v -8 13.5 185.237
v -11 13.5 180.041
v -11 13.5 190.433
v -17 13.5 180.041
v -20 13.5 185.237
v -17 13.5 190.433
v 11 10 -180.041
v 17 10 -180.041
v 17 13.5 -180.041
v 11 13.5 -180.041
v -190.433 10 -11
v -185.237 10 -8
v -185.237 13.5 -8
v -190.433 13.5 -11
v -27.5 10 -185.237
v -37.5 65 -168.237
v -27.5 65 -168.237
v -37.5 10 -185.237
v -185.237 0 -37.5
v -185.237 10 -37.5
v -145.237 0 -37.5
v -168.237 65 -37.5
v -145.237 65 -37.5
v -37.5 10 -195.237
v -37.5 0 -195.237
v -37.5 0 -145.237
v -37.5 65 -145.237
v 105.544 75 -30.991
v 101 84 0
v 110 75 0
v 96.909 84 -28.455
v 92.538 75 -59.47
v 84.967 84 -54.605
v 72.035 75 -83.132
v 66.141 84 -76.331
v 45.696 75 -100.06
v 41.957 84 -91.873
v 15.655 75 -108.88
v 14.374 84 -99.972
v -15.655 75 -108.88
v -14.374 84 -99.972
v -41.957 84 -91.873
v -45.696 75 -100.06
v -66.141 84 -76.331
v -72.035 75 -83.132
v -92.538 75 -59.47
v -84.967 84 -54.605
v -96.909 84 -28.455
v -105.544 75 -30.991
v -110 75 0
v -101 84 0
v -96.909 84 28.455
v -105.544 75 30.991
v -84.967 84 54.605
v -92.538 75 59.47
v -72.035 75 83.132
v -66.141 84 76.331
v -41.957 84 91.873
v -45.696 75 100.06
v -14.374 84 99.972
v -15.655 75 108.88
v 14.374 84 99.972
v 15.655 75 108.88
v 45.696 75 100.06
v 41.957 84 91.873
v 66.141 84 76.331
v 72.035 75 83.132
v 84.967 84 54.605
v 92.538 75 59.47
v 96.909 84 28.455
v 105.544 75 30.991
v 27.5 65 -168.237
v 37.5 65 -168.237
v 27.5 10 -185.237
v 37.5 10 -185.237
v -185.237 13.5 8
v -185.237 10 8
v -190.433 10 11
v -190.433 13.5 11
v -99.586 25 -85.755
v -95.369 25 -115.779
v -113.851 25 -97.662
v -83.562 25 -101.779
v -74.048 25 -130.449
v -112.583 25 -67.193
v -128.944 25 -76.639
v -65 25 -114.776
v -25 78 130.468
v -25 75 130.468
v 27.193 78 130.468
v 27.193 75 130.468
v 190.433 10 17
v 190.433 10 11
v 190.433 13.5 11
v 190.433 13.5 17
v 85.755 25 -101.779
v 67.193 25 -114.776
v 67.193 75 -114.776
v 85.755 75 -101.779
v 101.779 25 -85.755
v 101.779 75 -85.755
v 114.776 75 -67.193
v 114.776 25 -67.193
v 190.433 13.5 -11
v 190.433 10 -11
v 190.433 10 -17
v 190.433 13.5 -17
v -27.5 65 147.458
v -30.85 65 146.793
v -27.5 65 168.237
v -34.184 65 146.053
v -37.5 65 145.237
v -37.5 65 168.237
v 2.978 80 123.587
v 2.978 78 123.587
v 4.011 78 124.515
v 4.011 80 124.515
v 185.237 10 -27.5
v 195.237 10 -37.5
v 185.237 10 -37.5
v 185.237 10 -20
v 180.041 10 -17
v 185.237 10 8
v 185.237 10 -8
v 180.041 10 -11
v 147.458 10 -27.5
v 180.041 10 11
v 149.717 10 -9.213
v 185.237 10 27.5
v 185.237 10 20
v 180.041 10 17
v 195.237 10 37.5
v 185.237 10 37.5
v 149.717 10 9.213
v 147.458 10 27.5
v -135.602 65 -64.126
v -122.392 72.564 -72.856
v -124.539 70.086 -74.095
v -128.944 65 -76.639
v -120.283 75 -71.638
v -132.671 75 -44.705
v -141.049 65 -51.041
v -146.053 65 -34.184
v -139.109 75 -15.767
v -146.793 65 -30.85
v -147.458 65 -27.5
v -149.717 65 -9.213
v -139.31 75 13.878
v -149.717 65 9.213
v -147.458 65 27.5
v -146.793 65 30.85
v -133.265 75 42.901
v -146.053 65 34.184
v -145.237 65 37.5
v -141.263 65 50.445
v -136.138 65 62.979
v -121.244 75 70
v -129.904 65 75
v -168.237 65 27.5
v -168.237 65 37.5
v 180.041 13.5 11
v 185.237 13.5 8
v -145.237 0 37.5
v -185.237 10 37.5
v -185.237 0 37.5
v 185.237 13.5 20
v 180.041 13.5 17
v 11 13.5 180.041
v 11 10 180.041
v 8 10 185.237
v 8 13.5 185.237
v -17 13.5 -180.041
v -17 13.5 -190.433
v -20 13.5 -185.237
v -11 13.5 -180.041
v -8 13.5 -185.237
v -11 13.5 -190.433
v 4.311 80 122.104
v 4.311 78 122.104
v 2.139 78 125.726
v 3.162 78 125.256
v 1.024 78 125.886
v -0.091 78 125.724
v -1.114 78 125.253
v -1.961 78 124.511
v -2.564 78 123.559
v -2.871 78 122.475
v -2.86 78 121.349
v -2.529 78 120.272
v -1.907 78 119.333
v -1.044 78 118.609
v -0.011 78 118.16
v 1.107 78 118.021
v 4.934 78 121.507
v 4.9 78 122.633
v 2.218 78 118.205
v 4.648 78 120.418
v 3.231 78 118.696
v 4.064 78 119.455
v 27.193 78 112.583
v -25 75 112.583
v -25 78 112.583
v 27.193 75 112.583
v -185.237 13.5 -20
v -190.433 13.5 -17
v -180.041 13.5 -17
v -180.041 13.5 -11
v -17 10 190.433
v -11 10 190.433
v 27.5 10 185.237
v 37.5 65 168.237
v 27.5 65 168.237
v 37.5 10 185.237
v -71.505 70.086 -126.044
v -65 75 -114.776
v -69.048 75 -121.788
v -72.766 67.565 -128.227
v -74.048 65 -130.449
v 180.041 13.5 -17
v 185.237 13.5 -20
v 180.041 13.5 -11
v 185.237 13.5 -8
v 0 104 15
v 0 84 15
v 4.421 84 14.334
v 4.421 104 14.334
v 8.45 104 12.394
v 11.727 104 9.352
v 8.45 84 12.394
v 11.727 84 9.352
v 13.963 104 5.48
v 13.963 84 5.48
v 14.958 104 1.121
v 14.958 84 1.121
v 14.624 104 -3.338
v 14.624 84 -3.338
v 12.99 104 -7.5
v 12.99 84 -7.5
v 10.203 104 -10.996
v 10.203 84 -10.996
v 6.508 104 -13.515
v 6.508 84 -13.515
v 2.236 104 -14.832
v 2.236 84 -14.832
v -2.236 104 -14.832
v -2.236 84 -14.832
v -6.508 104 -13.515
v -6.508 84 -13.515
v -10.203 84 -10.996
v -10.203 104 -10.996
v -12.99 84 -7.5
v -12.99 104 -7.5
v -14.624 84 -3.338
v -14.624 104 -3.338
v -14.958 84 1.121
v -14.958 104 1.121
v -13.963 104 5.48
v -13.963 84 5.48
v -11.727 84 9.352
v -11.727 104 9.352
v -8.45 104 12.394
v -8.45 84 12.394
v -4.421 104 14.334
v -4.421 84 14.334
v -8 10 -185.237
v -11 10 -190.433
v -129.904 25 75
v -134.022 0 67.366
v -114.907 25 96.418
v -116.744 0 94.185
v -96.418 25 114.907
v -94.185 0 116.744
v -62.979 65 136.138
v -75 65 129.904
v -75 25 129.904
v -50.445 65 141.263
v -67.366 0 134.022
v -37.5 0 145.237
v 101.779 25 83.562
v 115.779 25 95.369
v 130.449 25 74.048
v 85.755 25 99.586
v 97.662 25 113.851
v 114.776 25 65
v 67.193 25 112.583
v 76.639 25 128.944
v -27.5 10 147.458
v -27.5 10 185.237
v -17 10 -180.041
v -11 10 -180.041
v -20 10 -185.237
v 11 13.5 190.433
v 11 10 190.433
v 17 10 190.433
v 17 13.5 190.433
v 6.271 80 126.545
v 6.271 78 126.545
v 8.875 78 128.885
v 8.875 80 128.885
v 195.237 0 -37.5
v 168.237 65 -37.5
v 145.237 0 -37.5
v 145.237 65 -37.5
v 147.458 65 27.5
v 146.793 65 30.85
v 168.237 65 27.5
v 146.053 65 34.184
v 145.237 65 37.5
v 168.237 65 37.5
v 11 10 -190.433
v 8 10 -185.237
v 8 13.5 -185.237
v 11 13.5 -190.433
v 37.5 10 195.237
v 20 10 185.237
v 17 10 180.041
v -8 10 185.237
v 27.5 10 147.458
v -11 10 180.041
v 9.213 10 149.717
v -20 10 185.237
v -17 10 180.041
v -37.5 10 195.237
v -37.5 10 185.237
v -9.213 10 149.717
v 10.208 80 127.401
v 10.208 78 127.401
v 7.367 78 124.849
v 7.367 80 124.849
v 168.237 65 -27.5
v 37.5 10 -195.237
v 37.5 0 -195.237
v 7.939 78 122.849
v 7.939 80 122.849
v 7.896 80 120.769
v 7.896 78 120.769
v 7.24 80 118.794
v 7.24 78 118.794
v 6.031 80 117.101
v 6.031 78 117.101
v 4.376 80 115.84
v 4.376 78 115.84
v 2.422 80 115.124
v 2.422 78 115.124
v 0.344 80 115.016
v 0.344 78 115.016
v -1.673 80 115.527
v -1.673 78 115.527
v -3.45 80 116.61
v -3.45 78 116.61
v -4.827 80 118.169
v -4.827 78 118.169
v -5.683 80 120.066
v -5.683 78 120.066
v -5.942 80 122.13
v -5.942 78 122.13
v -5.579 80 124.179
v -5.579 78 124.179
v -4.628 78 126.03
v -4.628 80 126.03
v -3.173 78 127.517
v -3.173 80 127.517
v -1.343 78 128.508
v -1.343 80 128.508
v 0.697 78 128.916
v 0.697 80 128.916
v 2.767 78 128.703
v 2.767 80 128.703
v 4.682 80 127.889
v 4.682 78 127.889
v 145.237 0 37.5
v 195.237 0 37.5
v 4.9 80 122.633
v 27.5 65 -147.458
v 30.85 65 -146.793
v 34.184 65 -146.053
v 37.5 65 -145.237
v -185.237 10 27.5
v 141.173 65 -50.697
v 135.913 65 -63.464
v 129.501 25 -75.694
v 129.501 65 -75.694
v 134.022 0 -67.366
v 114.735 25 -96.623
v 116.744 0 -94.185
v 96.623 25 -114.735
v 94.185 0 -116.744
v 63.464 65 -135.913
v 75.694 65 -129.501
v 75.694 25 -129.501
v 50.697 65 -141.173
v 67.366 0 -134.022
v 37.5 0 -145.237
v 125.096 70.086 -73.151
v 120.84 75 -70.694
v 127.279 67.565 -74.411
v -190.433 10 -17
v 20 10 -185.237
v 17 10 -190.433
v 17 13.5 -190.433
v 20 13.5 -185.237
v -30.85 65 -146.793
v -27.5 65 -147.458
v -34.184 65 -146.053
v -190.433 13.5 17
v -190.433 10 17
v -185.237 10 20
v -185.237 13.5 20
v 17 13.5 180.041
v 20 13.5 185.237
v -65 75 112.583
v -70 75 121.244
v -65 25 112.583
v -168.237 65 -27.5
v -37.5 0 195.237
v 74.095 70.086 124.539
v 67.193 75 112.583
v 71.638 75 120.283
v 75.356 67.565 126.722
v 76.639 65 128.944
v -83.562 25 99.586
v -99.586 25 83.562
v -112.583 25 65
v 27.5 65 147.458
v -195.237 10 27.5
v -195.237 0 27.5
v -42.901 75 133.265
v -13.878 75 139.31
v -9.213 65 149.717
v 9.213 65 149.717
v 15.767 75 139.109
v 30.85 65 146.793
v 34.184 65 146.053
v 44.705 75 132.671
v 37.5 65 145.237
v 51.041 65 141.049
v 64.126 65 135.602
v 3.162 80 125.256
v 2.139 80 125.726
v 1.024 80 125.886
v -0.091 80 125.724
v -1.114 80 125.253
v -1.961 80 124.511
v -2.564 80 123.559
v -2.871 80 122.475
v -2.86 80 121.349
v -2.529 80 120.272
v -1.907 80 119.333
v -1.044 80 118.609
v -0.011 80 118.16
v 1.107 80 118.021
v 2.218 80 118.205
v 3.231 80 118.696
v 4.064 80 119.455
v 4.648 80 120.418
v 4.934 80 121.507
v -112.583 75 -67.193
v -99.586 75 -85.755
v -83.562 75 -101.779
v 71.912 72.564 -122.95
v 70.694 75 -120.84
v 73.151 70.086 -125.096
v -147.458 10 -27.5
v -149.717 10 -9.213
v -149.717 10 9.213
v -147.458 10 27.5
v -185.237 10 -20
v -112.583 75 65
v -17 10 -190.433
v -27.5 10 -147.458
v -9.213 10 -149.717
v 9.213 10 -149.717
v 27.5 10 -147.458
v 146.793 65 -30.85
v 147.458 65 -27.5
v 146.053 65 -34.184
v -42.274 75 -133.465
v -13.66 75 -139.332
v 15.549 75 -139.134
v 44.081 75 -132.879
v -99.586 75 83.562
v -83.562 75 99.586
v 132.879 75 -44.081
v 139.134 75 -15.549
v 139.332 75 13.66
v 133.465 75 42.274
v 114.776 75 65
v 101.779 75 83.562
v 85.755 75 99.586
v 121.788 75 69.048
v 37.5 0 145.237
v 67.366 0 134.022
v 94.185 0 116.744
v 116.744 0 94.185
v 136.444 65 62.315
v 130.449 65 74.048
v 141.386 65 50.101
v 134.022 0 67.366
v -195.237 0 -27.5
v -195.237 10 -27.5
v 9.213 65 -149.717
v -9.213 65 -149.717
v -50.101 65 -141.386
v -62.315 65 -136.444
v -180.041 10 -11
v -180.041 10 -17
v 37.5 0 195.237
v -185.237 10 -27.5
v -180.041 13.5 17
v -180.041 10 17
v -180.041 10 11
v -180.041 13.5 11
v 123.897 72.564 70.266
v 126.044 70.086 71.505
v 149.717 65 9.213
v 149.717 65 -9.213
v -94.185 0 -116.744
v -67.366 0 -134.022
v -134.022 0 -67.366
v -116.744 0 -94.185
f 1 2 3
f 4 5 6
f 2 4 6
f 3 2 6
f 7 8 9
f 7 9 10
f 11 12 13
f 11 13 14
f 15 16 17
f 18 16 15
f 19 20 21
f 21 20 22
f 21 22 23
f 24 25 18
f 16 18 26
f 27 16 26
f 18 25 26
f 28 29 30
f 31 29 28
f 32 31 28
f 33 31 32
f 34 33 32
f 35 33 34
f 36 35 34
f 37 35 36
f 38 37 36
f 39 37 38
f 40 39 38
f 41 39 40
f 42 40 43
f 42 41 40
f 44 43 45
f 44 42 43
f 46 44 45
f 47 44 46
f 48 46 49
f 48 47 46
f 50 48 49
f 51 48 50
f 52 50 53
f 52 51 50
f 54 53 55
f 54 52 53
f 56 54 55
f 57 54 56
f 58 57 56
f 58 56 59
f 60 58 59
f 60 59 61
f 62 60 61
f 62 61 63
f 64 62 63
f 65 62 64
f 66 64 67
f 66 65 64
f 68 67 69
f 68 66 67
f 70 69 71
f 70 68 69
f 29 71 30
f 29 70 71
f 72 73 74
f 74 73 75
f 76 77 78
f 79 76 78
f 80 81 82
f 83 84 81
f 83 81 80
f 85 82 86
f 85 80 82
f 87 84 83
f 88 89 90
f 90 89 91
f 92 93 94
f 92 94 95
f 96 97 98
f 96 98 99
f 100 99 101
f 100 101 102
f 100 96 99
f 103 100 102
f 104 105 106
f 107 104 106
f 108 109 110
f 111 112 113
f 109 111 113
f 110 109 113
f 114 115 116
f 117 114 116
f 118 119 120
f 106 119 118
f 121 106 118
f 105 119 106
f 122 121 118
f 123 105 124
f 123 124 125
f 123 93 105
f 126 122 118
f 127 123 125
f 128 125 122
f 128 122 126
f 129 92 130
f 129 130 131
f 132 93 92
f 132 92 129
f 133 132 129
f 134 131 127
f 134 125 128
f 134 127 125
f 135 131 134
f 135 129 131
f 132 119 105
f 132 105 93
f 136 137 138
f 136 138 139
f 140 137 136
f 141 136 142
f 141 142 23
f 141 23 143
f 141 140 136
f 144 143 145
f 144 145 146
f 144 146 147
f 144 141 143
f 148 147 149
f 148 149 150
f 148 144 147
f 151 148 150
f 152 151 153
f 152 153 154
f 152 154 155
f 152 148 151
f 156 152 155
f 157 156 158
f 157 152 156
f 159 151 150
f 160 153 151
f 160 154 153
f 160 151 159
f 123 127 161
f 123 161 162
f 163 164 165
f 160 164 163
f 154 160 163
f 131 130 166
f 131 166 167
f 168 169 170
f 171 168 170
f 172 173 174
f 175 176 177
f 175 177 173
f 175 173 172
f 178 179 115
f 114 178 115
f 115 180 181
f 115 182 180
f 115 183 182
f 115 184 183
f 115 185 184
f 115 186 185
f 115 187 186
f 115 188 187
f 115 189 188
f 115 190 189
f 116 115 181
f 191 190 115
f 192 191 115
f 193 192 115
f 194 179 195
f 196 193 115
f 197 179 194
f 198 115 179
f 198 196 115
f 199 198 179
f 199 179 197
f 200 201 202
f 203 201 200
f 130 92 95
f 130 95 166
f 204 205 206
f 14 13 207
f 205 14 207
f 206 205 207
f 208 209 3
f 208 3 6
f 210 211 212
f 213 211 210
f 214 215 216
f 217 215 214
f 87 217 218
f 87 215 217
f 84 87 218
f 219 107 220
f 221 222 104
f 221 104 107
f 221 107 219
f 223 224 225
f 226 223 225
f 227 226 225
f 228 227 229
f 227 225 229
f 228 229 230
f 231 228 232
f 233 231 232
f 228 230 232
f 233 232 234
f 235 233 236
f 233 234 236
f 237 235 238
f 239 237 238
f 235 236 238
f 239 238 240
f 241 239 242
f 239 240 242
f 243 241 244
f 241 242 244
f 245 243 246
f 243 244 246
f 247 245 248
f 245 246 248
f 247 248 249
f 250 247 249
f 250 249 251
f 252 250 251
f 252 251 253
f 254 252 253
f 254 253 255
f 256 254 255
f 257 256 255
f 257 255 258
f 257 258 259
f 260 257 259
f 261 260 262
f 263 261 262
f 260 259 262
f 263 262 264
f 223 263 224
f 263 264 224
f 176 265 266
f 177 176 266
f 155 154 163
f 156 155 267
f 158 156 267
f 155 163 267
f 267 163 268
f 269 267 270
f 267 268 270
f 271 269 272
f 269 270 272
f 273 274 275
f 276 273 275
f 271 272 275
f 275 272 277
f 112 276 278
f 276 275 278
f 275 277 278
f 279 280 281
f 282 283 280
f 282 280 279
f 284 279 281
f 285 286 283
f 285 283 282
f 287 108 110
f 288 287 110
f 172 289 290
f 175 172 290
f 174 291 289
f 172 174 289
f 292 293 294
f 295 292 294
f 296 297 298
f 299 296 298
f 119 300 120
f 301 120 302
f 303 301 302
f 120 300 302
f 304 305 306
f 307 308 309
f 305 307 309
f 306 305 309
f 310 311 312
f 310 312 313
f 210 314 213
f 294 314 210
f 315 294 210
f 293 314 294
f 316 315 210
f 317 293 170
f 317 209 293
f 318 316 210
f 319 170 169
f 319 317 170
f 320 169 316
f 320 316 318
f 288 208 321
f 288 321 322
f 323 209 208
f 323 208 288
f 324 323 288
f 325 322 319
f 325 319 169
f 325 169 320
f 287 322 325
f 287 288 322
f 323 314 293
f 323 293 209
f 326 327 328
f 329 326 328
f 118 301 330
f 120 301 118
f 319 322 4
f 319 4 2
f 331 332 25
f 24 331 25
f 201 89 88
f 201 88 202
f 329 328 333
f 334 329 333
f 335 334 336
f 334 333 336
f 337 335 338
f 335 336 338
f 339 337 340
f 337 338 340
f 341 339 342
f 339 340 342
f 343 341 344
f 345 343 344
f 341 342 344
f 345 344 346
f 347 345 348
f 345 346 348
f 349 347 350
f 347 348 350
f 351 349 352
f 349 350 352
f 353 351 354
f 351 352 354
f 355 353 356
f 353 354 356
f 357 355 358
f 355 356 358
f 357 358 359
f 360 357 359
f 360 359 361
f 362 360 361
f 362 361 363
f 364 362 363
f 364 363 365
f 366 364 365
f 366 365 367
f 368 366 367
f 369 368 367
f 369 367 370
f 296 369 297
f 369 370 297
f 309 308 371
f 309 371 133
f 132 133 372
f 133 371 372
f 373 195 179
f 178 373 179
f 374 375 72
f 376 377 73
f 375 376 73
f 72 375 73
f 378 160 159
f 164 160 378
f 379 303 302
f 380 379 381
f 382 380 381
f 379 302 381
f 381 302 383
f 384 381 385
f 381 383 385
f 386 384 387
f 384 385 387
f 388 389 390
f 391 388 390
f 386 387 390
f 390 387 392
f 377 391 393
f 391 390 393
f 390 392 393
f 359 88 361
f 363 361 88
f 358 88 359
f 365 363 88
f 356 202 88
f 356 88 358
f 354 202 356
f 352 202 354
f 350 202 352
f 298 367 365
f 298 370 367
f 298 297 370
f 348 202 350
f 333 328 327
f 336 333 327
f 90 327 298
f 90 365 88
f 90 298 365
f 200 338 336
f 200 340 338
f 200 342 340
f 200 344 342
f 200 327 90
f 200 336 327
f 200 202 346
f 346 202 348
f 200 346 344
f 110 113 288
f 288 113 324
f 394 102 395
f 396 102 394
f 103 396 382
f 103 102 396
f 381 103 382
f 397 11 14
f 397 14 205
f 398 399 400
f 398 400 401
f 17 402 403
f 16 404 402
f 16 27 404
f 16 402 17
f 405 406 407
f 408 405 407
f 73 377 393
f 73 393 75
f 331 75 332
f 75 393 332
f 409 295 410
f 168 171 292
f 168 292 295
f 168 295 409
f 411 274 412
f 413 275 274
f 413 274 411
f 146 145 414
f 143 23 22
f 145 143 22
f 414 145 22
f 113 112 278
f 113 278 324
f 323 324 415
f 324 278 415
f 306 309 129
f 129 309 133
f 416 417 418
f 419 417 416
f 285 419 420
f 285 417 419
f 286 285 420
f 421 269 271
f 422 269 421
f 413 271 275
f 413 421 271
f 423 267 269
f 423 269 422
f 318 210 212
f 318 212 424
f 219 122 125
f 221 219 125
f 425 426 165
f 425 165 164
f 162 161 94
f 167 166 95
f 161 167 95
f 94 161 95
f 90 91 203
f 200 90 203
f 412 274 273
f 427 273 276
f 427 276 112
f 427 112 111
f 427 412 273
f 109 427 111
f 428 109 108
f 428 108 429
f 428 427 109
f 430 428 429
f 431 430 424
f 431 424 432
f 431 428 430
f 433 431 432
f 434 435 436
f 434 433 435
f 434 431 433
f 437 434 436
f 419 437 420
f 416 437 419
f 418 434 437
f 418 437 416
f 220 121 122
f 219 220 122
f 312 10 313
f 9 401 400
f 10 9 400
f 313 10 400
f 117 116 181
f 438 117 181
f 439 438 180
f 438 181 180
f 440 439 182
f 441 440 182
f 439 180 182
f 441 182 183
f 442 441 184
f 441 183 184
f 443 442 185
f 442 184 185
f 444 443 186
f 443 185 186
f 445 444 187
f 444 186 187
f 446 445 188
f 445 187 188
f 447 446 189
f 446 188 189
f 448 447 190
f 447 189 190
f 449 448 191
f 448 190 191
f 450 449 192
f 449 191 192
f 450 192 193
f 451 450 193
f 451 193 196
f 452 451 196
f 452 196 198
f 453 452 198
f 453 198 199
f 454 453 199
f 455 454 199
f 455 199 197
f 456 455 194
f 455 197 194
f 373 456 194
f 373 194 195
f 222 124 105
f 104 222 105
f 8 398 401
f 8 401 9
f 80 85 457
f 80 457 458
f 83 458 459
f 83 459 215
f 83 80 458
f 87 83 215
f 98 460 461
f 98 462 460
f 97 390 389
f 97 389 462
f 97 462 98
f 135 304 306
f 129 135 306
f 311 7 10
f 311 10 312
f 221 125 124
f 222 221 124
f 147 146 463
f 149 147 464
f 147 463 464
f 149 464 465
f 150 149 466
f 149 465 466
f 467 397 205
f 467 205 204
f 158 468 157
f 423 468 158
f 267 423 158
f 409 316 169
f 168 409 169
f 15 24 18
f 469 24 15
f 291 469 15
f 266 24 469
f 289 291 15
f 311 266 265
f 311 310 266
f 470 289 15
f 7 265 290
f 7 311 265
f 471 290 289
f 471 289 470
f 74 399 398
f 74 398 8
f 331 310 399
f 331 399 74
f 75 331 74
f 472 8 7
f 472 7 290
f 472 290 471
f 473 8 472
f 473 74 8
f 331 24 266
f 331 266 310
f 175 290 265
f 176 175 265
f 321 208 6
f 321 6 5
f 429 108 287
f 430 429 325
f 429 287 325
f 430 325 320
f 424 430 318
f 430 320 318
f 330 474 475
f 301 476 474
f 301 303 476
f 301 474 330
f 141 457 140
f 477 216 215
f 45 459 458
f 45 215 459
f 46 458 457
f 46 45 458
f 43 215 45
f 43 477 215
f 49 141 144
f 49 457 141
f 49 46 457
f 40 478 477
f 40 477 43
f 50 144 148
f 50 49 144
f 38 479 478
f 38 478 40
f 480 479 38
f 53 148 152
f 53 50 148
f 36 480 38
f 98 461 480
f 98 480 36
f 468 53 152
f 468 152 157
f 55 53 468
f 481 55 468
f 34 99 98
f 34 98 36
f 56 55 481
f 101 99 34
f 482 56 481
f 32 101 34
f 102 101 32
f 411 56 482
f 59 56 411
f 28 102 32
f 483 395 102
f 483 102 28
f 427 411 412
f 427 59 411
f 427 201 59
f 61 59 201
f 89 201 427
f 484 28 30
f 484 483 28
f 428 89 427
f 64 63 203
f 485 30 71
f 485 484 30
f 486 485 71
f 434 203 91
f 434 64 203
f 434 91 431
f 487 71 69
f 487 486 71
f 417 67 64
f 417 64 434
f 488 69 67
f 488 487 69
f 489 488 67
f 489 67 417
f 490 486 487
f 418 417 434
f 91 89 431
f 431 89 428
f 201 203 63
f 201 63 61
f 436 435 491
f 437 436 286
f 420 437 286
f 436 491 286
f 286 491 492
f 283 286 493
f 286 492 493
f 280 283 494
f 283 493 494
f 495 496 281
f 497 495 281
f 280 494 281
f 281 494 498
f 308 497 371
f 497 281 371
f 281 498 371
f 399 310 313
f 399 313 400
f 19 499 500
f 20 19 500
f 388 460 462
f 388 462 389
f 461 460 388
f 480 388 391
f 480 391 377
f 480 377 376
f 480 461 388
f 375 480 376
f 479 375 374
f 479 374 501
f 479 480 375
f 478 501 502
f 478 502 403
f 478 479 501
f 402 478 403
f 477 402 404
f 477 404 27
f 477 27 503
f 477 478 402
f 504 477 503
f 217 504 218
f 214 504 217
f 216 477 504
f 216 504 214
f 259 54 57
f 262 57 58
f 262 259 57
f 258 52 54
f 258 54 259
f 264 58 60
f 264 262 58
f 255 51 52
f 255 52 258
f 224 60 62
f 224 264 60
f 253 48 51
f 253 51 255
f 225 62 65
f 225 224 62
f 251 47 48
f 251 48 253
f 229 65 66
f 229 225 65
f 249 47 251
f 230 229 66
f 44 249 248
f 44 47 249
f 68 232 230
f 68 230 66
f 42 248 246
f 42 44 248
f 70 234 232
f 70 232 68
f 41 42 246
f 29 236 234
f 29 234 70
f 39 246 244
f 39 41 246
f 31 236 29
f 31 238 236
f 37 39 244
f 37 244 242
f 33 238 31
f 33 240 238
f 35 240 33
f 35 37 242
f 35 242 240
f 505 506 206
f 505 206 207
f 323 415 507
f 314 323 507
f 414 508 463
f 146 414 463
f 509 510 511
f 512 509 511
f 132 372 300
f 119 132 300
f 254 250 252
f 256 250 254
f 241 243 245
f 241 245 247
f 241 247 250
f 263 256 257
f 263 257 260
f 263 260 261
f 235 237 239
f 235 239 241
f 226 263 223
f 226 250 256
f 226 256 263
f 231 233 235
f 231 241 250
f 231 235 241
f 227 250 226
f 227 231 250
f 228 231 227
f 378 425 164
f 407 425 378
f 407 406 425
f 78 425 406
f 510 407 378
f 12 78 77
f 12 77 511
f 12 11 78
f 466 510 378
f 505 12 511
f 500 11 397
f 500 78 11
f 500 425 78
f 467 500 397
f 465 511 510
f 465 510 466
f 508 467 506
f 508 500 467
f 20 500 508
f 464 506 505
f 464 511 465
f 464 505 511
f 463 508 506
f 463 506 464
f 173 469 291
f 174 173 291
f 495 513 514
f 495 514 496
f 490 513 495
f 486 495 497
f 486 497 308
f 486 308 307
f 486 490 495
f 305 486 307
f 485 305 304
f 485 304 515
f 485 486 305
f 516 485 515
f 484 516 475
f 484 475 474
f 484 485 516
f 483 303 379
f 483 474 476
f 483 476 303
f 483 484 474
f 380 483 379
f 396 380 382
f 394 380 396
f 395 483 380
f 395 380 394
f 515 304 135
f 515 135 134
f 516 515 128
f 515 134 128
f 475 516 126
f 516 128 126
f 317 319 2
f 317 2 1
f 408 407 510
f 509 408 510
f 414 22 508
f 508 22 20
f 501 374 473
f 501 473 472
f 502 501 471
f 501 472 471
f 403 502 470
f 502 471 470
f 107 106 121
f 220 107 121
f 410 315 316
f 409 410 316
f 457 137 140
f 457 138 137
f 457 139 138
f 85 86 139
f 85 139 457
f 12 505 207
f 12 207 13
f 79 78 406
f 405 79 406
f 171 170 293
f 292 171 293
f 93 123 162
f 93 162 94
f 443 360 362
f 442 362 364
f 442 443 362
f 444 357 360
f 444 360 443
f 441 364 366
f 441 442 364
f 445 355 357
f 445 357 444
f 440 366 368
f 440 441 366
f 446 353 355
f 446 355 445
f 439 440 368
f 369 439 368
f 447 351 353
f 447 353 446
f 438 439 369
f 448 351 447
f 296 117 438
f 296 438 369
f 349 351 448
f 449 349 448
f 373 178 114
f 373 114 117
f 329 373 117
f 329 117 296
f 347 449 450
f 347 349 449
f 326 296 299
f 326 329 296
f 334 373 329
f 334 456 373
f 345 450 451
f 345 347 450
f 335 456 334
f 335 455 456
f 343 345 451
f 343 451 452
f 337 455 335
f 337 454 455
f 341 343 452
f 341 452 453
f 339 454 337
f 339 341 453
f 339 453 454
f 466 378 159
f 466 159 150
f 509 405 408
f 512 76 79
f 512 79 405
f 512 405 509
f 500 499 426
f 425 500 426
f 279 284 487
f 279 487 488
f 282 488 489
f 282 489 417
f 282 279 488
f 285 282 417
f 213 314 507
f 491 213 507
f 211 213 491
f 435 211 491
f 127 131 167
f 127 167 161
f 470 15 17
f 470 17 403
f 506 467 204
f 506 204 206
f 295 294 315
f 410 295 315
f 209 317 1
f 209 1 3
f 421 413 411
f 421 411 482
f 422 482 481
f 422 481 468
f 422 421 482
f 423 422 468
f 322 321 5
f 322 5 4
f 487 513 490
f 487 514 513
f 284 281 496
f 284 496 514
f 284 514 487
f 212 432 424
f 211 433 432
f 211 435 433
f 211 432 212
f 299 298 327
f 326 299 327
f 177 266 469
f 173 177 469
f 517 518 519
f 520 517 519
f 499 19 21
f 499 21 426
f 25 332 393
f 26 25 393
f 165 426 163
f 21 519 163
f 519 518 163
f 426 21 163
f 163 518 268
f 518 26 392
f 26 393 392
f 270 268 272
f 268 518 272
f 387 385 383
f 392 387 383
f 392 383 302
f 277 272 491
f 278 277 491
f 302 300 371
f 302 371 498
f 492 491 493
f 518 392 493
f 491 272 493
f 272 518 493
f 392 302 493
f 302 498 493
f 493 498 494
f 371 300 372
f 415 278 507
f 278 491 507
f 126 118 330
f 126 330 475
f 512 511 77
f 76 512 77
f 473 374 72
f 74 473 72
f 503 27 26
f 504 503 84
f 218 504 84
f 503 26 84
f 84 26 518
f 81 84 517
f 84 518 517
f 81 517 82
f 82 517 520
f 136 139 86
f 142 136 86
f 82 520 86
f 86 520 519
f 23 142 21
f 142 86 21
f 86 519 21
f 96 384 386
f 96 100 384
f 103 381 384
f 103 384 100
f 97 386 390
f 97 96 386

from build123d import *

# Parameters (mm, degrees)
SKETCH1_R                = 150
BOSS_EXTRUDE1_DEPTH      = 75
CHAMFER1_SIZE            = 10
BOSS_EXTRUDE2_START      = -75
BOSS_EXTRUDE2_DEPTH      = 10
CHAMFER2_SIZE            = 10
BOSS_EXTRUDE3_DEPTH      = 10
BOSS_EXTRUDE4_DEPTH      = 3.5
CIRPATTERN1_COUNT        = 4
CIRPATTERN1_COPY_1_DEPTH = 10
CIRPATTERN1_COPY_2_DEPTH = 10
CIRPATTERN1_COPY_3_DEPTH = 10
CIRPATTERN1_COPY_4_DEPTH = 3.5
CIRPATTERN1_COPY_5_DEPTH = 3.5
CIRPATTERN1_COPY_6_DEPTH = 3.5
CUT_EXTRUDE1_START       = -50
CUT_EXTRUDE1_DEPTH       = 50
CIRPATTERN2_COUNT        = 4
SKETCH7_R                = 110
BOSS_EXTRUDE5_DEPTH      = 9
BOSS_EXTRUDE5_TAPER      = 45
SKETCH8_R                = 15
BOSS_EXTRUDE6_DEPTH      = 20
SKETCH9_W                = 52.192884268
SKETCH9_H                = 17.88463766
BOSS_EXTRUDE7_DEPTH      = 3
BOSS_EXTRUDE8_DEPTH      = 2


# Read off the part's stored shape, not the designer's step: Cut-Extrude1
with BuildPart() as part:
    # Sketch1 → Boss-Extrude1 (new body)
    with BuildSketch(Plane(origin=(0, 0, 0), x_dir=(1, 0, 0), z_dir=(0, 1, 0))):
        with Locations(Location((0, 0, 0), (0, 0, 270))):
            Circle(SKETCH1_R)
    extrude(amount=BOSS_EXTRUDE1_DEPTH)

    # Chamfer1
    chamfer1_edges = [part.edges().sort_by_distance(p)[0] for p in [
        (0, 75, -150),
    ]]
    chamfer(chamfer1_edges, length=CHAMFER1_SIZE)

    # Sketch3 → Boss-Extrude2 (add)
    with BuildSketch(Plane(origin=(0, 75, 0), x_dir=(1, 0, 0), z_dir=(0, 1, 0)).offset(BOSS_EXTRUDE2_START)):
        with BuildLine():
            Line((-145.236875483, 37.5), (-195.236875483, 37.5))
            Line((-195.236875483, 37.5), (-195.236875483, -37.5))
            Line((-195.236875483, -37.5), (-145.236875483, -37.5))
            ThreePointArc((-145.236875483, -37.5), (-150, 0), (-145.236875483, 37.5))
        make_face()
    boss_extrude2 = extrude(amount=BOSS_EXTRUDE2_DEPTH)

    # Chamfer2
    chamfer2_edges = [part.edges().sort_by_distance(p)[0] for p in [
        (-195.236875483, 5, -37.5),
        (-195.236875483, 5, 37.5),
    ]]
    chamfer(chamfer2_edges, length=CHAMFER2_SIZE)

    # Sketch4 → Boss-Extrude3 (add)
    with BuildSketch(Plane.XY.offset(37.5)):
        Polygon((-185.236875483, 10), (-145.236875483, 10), (-145.236875483, 65), (-168.236875483, 65), align=None)
    boss_extrude3 = extrude(amount=-BOSS_EXTRUDE3_DEPTH)

    # Sketch5 → Boss-Extrude4 (add)
    with BuildSketch(Plane(origin=(0, 10, 0), x_dir=(1, 0, 0), z_dir=(0, 1, 0))):
        Polygon((-185.236875483, -20), (-180.04072306, -17), (-180.04072306, -11), (-185.236875483, -8), (-190.433027905, -11), (-190.433027905, -17), align=None)
    boss_extrude4 = extrude(amount=BOSS_EXTRUDE4_DEPTH)

    # Mirror1: Boss-Extrude3, Boss-Extrude4 across plane
    add(boss_extrude3.mirror(Plane.XY))
    add(boss_extrude4.mirror(Plane.XY))

    # CirPattern1: Boss-Extrude2, Boss-Extrude3, Boss-Extrude4 ×4 about axis
    cirpattern1_axis = Axis((0, 0, 0), (0, 1, 0))
    add([boss_extrude2.rotate(cirpattern1_axis, i * 360 / CIRPATTERN1_COUNT) for i in range(1, CIRPATTERN1_COUNT)])
    add([boss_extrude3.rotate(cirpattern1_axis, i * 360 / CIRPATTERN1_COUNT) for i in range(1, CIRPATTERN1_COUNT)])
    add([boss_extrude4.rotate(cirpattern1_axis, i * 360 / CIRPATTERN1_COUNT) for i in range(1, CIRPATTERN1_COUNT)])

    # CirPattern1 copy 1 sketch → CirPattern1 copy 1 (add)
    with BuildSketch(Plane(origin=(-37.5, 0, 0), x_dir=(0, 0, -1), z_dir=(-1, 0, 0))):
        Polygon((-185.236875483, -10), (-145.236875483, -10), (-145.236875483, -65), (-168.236875483, -65), align=None)
    extrude(amount=-CIRPATTERN1_COPY_1_DEPTH)

    # CirPattern1 copy 2 sketch → CirPattern1 copy 2 (add)
    with BuildSketch(Plane(origin=(0, 0, 37.5), x_dir=(-1, 0, 0), z_dir=(0, 0, 1))):
        Polygon((-185.236875483, -10), (-145.236875483, -10), (-145.236875483, -65), (-168.236875483, -65), align=None)
    extrude(amount=-CIRPATTERN1_COPY_2_DEPTH)

    # CirPattern1 copy 3 sketch → CirPattern1 copy 3 (add)
    with BuildSketch(Plane(origin=(37.5, 0, 0), x_dir=(0, 0, 1), z_dir=(1, 0, 0))):
        Polygon((-185.236875483, -10), (-145.236875483, -10), (-145.236875483, -65), (-168.236875483, -65), align=None)
    extrude(amount=-CIRPATTERN1_COPY_3_DEPTH)

    # CirPattern1 copy 4 sketch → CirPattern1 copy 4 (add)
    with BuildSketch(Plane(origin=(0, 10, 0), x_dir=(0, 0, -1), z_dir=(0, 1, 0))):
        Polygon((-185.236875483, 20), (-180.04072306, 17), (-180.04072306, 11), (-185.236875483, 8), (-190.433027905, 11), (-190.433027905, 17), align=None)
    extrude(amount=CIRPATTERN1_COPY_4_DEPTH)

    # CirPattern1 copy 5 sketch → CirPattern1 copy 5 (add)
    with BuildSketch(Plane(origin=(0, 10, 0), x_dir=(-1, 0, 0), z_dir=(0, 1, 0))):
        Polygon((-185.236875483, 20), (-180.04072306, 17), (-180.04072306, 11), (-185.236875483, 8), (-190.433027905, 11), (-190.433027905, 17), align=None)
    extrude(amount=CIRPATTERN1_COPY_5_DEPTH)

    # CirPattern1 copy 6 sketch → CirPattern1 copy 6 (add)
    with BuildSketch(Plane.ZX.offset(10)):
        Polygon((-185.236875483, 20), (-180.04072306, 17), (-180.04072306, 11), (-185.236875483, 8), (-190.433027905, 11), (-190.433027905, 17), align=None)
    extrude(amount=CIRPATTERN1_COPY_6_DEPTH)

    # Cut-Extrude1 outline → Cut-Extrude1 (cut)
    with BuildSketch(Plane(origin=(0, 75, 0), x_dir=(1, 0, 0), z_dir=(0, 1, 0)).offset(CUT_EXTRUDE1_START)):
        with BuildLine():
            ThreePointArc((-65, -112.583302492), (-91.923881554, -91.923881554), (-112.583302492, -65))
            Line((-112.583302492, -65), (-129.903810568, -75))
            ThreePointArc((-129.903810568, -75), (-106.066017178, -106.066017178), (-75, -129.903810568))
            Line((-75, -129.903810568), (-65, -112.583302492))
        make_face()
    cut_extrude1 = extrude(amount=CUT_EXTRUDE1_DEPTH, mode=Mode.SUBTRACT)

    # CirPattern2: Cut-Extrude1 ×4 about axis
    cirpattern2_axis = Axis((1.096442134, 0, -1.096442134), (0, 1, 0))
    for i in range(1, CIRPATTERN2_COUNT):
        add(cut_extrude1.rotate(cirpattern2_axis, i * 360 / CIRPATTERN2_COUNT), mode=Mode.SUBTRACT)

    # Sketch7 → Boss-Extrude5 (add)
    with BuildSketch(Plane(origin=(0, 75, 0), x_dir=(1, 0, 0), z_dir=(0, 1, 0))):
        Circle(SKETCH7_R)
    extrude(amount=BOSS_EXTRUDE5_DEPTH, taper=BOSS_EXTRUDE5_TAPER)

    # Sketch8 → Boss-Extrude6 (add)
    with BuildSketch(Plane(origin=(0, 84, 0), x_dir=(1, 0, 0), z_dir=(0, 1, 0))):
        with Locations(Location((0, 0, 0), (0, 0, 270))):
            Circle(SKETCH8_R)
    extrude(amount=BOSS_EXTRUDE6_DEPTH)

    # Sketch9 → Boss-Extrude7 (add)
    with BuildSketch(Plane(origin=(0, 75, 0), x_dir=(1, 0, 0), z_dir=(0, 1, 0))):
        with Locations((1.096442134, -121.525621322)):
            Rectangle(SKETCH9_W, SKETCH9_H)
    extrude(amount=BOSS_EXTRUDE7_DEPTH)

    # Sketch10 → Boss-Extrude8 (add)
    with BuildSketch(Plane(origin=(0, 78, 0), x_dir=(1, 0, 0), z_dir=(0, 1, 0))):
        with BuildLine():
            Line((6.270682812, -126.545342988), (8.874678556, -128.884668308))
            Line((8.874678556, -128.884668308), (10.207504523, -127.401046891))
            Line((10.207504523, -127.401046891), (7.367027593, -124.84927636))
            ThreePointArc((7.367027593, -124.84927636), (-4.827336948, -118.169160855), (6.270682812, -126.545342988))
        make_face()
        with BuildLine():
            Line((4.310616526, -122.103519263), (2.977790559, -123.58714068))
            Line((2.977790559, -123.58714068), (4.010713475, -124.515077192))
            ThreePointArc((4.010713475, -124.515077192), (-2.528998008, -120.272284372), (4.900321371, -122.63328644))
            Line((4.900321371, -122.63328644), (4.310616526, -122.103519263))
        make_face(mode=Mode.SUBTRACT)
    extrude(amount=BOSS_EXTRUDE8_DEPTH)


solid = part.part
